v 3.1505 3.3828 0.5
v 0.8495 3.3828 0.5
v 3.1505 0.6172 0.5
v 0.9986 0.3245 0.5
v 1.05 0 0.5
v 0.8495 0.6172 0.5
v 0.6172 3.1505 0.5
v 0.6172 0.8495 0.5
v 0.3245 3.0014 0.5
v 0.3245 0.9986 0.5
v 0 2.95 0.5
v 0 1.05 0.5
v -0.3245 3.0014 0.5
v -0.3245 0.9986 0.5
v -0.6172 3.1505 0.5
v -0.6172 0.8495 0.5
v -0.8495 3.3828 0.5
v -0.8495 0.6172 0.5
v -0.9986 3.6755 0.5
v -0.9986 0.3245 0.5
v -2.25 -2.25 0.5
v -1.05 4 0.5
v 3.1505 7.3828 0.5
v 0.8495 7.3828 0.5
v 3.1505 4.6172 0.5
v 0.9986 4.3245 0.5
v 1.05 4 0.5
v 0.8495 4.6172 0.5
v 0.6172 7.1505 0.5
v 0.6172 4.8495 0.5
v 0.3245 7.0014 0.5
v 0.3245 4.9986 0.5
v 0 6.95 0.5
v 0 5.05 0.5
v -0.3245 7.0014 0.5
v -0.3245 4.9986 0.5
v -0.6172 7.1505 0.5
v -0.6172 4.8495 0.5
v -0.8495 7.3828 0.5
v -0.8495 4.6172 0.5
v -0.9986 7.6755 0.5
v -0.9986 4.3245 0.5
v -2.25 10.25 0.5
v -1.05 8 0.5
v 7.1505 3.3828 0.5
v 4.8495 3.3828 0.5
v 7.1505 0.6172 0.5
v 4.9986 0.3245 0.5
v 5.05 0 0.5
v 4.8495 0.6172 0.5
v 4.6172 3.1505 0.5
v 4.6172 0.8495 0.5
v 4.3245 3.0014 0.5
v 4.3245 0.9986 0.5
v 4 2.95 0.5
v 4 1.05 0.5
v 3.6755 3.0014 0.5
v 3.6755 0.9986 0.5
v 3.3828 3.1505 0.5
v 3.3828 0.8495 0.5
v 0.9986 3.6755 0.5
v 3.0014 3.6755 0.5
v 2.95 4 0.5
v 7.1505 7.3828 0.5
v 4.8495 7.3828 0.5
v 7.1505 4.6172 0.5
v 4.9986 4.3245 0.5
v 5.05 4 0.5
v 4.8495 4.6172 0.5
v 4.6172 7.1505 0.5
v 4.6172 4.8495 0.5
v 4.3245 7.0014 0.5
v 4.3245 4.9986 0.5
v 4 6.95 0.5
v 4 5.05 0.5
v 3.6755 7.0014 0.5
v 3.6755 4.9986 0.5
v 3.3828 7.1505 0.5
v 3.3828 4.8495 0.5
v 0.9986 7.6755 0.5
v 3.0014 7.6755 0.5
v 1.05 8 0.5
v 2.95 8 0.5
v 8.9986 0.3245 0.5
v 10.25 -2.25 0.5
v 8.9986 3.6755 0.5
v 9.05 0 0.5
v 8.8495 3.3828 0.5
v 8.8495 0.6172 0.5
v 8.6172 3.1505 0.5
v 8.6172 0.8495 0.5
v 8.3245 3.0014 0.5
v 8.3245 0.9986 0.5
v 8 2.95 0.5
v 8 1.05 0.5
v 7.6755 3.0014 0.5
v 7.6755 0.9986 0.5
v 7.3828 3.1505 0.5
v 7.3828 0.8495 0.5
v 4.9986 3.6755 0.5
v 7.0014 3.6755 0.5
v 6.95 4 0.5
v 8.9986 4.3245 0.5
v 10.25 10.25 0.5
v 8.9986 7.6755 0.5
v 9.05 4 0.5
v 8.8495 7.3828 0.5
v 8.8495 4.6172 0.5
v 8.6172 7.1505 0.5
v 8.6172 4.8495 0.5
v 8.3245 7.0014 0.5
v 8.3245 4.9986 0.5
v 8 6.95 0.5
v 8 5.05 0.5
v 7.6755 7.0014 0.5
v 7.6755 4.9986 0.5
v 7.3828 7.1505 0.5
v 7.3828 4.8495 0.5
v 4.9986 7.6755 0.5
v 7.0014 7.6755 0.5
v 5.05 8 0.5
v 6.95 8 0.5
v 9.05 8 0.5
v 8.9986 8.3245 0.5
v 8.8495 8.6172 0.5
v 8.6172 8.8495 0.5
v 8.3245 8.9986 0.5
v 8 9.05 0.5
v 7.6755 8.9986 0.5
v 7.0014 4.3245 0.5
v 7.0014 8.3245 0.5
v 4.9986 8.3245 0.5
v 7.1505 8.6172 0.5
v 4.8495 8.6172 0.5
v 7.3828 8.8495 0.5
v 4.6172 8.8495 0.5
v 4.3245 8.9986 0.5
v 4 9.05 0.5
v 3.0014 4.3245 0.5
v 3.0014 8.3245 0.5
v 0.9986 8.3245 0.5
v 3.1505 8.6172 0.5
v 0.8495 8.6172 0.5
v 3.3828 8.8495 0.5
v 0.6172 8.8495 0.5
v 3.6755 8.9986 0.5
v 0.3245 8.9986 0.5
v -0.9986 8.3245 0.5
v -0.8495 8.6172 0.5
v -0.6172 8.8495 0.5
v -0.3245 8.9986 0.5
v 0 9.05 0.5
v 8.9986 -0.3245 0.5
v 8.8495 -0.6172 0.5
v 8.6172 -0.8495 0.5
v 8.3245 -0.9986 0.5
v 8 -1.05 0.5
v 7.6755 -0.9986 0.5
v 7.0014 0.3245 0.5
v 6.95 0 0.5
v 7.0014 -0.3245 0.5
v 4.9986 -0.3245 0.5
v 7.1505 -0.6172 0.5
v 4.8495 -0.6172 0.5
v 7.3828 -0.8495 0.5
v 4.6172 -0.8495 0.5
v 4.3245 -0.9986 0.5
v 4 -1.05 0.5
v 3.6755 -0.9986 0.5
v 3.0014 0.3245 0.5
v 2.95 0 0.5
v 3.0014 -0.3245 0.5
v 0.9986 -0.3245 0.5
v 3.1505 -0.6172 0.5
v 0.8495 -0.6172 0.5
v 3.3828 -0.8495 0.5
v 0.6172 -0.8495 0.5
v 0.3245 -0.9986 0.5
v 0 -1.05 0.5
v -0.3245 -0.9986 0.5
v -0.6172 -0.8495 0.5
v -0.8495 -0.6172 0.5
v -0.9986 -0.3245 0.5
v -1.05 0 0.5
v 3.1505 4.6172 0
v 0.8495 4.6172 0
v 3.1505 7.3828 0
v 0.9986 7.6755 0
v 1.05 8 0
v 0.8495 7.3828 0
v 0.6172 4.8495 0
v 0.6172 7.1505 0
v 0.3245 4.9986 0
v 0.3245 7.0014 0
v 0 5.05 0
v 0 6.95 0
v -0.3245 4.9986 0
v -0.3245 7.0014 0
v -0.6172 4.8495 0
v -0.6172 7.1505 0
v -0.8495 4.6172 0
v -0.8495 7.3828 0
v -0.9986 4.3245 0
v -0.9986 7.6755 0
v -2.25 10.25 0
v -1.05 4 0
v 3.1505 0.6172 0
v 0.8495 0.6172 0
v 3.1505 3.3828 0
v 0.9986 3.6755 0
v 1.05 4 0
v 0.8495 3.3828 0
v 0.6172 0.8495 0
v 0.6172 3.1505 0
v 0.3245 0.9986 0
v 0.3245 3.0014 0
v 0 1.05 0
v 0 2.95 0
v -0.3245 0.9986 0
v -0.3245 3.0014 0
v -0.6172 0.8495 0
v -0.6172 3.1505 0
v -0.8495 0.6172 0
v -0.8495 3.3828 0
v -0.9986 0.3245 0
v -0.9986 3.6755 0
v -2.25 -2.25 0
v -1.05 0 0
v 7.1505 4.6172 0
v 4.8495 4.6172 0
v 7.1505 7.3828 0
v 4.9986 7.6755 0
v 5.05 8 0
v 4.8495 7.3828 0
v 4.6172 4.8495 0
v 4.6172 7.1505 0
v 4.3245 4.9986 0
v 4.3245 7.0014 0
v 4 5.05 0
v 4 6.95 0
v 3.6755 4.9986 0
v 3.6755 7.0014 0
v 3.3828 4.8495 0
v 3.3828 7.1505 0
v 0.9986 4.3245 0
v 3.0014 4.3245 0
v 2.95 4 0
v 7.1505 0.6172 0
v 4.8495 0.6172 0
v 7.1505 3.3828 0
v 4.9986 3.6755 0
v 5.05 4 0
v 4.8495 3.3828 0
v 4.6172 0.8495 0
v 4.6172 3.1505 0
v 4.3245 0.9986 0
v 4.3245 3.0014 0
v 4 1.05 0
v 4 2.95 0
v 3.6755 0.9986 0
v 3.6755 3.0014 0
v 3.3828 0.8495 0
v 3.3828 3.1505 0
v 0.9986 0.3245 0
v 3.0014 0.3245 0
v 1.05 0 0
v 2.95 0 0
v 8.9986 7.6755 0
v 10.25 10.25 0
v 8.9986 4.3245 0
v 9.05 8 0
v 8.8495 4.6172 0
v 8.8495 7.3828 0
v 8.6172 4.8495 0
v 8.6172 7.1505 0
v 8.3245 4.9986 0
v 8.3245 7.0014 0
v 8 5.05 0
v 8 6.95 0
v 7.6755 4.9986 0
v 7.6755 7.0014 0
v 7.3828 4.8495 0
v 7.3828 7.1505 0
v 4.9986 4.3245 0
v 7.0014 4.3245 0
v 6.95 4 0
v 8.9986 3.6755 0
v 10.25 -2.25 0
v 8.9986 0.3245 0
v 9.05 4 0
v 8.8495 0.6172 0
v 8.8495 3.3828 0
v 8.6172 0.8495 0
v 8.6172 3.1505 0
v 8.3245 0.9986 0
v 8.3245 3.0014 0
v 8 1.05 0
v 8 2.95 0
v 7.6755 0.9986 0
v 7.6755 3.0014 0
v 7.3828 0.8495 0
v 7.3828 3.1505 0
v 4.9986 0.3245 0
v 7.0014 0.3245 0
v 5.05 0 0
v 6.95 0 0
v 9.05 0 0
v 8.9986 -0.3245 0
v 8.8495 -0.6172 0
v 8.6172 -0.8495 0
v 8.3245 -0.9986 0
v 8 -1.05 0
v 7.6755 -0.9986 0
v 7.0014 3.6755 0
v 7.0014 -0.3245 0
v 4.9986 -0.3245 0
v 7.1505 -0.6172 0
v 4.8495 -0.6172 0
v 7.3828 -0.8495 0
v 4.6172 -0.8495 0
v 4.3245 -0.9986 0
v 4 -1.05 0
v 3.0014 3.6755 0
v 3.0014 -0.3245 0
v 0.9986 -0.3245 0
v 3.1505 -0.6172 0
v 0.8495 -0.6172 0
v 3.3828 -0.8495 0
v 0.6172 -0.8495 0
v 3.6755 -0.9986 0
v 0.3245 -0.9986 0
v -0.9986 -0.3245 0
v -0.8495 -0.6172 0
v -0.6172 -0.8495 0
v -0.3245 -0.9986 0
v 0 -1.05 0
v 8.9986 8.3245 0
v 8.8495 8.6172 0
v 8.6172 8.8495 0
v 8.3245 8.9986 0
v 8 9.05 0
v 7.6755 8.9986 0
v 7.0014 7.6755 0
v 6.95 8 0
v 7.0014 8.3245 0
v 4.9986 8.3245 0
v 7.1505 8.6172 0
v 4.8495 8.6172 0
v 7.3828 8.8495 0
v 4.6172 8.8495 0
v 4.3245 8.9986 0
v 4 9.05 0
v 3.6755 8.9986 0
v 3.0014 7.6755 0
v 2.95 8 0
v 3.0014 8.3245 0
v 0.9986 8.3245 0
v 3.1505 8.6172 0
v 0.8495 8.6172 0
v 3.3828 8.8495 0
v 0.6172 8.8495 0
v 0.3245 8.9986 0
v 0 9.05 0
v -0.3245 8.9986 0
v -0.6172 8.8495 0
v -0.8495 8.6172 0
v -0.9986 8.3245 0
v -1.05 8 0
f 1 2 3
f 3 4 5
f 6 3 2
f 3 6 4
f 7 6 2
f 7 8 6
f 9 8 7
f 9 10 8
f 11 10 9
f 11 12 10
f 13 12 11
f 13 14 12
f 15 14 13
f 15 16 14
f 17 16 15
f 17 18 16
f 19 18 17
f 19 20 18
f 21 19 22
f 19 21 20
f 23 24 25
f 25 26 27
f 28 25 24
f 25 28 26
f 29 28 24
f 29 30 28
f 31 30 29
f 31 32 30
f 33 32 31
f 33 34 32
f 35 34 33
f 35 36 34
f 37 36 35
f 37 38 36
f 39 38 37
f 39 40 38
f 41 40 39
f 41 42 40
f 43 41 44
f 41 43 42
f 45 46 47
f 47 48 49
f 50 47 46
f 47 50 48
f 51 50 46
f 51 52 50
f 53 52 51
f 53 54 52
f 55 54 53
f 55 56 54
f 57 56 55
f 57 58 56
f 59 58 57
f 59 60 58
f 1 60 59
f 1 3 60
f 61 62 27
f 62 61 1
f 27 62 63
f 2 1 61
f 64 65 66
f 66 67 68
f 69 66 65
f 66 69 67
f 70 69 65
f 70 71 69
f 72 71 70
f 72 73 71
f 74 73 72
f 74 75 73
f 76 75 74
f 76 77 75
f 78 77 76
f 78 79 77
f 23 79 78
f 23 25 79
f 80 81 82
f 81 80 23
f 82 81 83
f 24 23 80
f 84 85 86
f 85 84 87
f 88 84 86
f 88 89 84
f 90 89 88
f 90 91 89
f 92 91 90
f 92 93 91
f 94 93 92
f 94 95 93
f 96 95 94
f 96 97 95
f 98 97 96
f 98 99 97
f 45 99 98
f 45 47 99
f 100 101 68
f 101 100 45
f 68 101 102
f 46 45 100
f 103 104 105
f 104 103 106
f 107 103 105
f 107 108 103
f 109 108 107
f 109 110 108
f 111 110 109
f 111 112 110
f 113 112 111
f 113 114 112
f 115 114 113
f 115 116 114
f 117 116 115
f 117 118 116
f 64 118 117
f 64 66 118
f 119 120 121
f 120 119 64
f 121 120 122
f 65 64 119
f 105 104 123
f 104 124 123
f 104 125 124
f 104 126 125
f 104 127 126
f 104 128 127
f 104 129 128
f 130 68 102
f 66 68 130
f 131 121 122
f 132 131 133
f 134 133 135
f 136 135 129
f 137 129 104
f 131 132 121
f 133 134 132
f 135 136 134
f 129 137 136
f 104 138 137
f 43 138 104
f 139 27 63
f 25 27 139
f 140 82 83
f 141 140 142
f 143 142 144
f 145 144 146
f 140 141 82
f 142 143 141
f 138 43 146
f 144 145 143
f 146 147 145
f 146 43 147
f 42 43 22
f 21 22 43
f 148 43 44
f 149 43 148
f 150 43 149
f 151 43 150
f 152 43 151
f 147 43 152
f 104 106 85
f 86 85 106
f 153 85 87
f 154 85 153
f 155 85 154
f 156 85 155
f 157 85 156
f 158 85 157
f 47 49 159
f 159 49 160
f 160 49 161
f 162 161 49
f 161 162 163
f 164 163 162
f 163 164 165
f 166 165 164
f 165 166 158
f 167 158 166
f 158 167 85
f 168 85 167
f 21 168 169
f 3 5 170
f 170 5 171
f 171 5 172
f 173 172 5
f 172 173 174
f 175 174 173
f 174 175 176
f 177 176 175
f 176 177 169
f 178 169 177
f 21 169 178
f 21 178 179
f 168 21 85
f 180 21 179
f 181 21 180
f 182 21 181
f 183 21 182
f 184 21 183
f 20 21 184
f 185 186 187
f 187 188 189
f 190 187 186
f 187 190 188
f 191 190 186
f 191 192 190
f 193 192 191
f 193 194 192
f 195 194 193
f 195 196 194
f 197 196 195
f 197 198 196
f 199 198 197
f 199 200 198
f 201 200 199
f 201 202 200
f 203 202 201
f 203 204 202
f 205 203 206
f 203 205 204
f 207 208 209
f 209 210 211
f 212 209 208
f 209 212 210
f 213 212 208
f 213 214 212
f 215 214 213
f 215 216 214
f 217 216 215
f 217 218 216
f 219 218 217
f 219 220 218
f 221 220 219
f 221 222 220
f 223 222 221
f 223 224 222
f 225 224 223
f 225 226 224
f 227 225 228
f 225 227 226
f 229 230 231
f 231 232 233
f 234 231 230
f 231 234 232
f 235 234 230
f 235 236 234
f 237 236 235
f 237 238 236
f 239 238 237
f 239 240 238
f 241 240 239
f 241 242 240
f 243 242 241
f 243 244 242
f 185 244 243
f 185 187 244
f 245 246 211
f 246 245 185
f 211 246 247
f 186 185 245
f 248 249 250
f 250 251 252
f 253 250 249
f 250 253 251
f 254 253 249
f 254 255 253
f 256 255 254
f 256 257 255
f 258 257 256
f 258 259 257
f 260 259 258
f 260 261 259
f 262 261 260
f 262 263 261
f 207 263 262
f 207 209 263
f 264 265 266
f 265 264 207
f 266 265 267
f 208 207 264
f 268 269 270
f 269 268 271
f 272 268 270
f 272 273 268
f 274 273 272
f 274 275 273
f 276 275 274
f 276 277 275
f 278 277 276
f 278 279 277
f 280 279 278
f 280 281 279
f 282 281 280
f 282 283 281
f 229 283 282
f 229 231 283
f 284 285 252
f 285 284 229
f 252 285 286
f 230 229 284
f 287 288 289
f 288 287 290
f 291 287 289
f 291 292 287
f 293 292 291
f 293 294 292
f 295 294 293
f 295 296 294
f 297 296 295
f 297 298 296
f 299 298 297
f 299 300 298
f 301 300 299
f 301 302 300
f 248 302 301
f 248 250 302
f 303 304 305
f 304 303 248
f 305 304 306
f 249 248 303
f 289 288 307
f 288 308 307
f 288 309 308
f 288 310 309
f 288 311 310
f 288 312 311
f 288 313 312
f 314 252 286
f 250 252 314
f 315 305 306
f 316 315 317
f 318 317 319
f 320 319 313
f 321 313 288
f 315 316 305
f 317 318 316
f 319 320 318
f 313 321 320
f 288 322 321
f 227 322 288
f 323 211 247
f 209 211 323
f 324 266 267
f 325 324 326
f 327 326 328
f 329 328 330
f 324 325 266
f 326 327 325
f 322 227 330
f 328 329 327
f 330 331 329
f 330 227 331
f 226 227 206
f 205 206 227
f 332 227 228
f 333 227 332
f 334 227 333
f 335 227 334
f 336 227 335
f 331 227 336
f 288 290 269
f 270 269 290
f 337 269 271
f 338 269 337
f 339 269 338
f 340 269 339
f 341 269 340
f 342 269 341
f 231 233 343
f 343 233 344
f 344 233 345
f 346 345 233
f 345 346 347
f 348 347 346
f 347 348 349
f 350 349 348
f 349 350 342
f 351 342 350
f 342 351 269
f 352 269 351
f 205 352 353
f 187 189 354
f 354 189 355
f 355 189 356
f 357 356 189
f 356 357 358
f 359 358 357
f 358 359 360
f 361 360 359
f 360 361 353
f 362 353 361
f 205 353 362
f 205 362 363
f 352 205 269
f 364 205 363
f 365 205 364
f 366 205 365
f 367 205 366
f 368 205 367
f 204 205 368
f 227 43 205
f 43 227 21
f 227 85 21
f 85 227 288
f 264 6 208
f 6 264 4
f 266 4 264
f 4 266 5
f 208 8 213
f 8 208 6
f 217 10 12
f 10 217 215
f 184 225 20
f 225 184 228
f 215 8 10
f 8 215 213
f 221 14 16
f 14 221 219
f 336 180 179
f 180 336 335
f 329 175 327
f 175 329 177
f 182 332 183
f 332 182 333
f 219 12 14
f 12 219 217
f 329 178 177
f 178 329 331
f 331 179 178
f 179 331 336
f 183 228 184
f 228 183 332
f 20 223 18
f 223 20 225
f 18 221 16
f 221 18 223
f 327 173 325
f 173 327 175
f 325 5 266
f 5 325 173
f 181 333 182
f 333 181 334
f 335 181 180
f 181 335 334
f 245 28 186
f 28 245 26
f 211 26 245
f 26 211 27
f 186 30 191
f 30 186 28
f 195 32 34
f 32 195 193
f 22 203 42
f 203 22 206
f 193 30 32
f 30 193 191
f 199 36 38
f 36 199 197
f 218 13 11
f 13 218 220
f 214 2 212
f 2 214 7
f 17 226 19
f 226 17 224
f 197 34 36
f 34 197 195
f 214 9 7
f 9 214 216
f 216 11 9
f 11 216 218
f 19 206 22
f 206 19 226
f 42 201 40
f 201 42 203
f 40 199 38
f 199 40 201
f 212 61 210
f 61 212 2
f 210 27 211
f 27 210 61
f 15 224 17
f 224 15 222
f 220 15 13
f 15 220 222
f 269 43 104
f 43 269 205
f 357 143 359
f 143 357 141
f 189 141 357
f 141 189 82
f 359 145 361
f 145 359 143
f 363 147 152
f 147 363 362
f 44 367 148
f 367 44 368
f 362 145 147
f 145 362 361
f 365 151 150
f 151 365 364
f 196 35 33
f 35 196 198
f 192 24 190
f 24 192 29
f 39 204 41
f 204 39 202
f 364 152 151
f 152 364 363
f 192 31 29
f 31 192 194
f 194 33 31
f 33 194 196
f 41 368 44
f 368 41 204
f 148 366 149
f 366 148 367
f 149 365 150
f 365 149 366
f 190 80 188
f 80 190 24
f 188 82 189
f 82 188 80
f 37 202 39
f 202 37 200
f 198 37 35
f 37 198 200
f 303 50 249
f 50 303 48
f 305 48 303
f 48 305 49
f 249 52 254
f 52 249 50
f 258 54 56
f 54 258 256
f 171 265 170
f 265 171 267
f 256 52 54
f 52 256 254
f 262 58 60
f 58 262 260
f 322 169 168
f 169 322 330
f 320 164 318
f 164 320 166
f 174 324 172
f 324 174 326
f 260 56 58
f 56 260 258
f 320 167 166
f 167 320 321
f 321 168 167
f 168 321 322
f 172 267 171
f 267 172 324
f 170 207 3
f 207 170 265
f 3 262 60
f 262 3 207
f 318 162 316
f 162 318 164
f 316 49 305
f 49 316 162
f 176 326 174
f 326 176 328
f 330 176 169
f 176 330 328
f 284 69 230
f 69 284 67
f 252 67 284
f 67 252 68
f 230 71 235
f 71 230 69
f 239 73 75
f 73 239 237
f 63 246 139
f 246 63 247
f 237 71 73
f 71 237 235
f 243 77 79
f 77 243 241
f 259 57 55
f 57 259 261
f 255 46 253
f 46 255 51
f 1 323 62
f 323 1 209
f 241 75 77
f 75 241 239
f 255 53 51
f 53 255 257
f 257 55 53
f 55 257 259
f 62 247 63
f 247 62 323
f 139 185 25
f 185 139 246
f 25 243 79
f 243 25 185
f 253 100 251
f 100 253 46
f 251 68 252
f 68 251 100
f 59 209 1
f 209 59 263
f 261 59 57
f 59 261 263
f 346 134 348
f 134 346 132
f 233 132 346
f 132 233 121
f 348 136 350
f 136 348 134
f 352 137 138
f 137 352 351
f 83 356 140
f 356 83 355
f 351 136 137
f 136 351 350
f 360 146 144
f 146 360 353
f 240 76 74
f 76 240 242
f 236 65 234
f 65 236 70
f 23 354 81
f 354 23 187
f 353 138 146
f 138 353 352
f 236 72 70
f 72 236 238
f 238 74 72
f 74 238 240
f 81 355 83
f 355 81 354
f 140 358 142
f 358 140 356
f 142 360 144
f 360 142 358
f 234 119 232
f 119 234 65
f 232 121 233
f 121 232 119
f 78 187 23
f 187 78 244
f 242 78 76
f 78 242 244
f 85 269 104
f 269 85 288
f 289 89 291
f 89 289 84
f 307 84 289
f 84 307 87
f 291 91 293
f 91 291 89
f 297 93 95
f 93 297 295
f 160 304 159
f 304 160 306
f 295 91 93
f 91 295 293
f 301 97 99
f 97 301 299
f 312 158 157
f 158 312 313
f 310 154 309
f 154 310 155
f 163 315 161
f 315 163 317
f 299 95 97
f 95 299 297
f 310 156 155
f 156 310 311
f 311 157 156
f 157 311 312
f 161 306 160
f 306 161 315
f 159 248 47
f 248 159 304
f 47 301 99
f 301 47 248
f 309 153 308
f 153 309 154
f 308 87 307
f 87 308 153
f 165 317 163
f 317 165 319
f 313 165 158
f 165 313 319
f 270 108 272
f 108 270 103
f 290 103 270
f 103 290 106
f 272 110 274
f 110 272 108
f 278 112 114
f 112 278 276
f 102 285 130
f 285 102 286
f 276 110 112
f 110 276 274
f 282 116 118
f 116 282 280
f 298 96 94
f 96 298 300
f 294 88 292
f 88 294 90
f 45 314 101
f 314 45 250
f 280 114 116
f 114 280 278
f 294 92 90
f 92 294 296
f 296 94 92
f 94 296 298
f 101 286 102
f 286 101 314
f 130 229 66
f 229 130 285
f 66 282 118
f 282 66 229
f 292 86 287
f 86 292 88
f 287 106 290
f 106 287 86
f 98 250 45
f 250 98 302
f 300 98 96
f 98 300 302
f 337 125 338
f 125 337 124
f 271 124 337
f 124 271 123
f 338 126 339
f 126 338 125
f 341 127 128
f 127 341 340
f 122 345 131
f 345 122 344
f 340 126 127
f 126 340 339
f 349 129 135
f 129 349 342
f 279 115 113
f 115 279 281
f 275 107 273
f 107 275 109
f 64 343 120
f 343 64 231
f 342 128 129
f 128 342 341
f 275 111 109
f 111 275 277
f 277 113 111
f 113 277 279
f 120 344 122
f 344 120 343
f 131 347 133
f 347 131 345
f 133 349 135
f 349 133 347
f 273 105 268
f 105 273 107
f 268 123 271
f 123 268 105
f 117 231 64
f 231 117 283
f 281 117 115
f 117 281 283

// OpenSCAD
$fn = 20;

hueco = 2.1;
separacion = 4;
x = 3;
y = 3;
alto = 0.5;
extra = 0.5;

for (i=[0:x-1]) {
    for (j=[0:y-1]) {
        translate([i * separacion ,j * separacion , 0])
            difference() {
                translate([0, 0, alto/2]) cube([separacion + extra, separacion + extra, alto], true);
                cylinder(alto, d=hueco);
            }
    }
}
